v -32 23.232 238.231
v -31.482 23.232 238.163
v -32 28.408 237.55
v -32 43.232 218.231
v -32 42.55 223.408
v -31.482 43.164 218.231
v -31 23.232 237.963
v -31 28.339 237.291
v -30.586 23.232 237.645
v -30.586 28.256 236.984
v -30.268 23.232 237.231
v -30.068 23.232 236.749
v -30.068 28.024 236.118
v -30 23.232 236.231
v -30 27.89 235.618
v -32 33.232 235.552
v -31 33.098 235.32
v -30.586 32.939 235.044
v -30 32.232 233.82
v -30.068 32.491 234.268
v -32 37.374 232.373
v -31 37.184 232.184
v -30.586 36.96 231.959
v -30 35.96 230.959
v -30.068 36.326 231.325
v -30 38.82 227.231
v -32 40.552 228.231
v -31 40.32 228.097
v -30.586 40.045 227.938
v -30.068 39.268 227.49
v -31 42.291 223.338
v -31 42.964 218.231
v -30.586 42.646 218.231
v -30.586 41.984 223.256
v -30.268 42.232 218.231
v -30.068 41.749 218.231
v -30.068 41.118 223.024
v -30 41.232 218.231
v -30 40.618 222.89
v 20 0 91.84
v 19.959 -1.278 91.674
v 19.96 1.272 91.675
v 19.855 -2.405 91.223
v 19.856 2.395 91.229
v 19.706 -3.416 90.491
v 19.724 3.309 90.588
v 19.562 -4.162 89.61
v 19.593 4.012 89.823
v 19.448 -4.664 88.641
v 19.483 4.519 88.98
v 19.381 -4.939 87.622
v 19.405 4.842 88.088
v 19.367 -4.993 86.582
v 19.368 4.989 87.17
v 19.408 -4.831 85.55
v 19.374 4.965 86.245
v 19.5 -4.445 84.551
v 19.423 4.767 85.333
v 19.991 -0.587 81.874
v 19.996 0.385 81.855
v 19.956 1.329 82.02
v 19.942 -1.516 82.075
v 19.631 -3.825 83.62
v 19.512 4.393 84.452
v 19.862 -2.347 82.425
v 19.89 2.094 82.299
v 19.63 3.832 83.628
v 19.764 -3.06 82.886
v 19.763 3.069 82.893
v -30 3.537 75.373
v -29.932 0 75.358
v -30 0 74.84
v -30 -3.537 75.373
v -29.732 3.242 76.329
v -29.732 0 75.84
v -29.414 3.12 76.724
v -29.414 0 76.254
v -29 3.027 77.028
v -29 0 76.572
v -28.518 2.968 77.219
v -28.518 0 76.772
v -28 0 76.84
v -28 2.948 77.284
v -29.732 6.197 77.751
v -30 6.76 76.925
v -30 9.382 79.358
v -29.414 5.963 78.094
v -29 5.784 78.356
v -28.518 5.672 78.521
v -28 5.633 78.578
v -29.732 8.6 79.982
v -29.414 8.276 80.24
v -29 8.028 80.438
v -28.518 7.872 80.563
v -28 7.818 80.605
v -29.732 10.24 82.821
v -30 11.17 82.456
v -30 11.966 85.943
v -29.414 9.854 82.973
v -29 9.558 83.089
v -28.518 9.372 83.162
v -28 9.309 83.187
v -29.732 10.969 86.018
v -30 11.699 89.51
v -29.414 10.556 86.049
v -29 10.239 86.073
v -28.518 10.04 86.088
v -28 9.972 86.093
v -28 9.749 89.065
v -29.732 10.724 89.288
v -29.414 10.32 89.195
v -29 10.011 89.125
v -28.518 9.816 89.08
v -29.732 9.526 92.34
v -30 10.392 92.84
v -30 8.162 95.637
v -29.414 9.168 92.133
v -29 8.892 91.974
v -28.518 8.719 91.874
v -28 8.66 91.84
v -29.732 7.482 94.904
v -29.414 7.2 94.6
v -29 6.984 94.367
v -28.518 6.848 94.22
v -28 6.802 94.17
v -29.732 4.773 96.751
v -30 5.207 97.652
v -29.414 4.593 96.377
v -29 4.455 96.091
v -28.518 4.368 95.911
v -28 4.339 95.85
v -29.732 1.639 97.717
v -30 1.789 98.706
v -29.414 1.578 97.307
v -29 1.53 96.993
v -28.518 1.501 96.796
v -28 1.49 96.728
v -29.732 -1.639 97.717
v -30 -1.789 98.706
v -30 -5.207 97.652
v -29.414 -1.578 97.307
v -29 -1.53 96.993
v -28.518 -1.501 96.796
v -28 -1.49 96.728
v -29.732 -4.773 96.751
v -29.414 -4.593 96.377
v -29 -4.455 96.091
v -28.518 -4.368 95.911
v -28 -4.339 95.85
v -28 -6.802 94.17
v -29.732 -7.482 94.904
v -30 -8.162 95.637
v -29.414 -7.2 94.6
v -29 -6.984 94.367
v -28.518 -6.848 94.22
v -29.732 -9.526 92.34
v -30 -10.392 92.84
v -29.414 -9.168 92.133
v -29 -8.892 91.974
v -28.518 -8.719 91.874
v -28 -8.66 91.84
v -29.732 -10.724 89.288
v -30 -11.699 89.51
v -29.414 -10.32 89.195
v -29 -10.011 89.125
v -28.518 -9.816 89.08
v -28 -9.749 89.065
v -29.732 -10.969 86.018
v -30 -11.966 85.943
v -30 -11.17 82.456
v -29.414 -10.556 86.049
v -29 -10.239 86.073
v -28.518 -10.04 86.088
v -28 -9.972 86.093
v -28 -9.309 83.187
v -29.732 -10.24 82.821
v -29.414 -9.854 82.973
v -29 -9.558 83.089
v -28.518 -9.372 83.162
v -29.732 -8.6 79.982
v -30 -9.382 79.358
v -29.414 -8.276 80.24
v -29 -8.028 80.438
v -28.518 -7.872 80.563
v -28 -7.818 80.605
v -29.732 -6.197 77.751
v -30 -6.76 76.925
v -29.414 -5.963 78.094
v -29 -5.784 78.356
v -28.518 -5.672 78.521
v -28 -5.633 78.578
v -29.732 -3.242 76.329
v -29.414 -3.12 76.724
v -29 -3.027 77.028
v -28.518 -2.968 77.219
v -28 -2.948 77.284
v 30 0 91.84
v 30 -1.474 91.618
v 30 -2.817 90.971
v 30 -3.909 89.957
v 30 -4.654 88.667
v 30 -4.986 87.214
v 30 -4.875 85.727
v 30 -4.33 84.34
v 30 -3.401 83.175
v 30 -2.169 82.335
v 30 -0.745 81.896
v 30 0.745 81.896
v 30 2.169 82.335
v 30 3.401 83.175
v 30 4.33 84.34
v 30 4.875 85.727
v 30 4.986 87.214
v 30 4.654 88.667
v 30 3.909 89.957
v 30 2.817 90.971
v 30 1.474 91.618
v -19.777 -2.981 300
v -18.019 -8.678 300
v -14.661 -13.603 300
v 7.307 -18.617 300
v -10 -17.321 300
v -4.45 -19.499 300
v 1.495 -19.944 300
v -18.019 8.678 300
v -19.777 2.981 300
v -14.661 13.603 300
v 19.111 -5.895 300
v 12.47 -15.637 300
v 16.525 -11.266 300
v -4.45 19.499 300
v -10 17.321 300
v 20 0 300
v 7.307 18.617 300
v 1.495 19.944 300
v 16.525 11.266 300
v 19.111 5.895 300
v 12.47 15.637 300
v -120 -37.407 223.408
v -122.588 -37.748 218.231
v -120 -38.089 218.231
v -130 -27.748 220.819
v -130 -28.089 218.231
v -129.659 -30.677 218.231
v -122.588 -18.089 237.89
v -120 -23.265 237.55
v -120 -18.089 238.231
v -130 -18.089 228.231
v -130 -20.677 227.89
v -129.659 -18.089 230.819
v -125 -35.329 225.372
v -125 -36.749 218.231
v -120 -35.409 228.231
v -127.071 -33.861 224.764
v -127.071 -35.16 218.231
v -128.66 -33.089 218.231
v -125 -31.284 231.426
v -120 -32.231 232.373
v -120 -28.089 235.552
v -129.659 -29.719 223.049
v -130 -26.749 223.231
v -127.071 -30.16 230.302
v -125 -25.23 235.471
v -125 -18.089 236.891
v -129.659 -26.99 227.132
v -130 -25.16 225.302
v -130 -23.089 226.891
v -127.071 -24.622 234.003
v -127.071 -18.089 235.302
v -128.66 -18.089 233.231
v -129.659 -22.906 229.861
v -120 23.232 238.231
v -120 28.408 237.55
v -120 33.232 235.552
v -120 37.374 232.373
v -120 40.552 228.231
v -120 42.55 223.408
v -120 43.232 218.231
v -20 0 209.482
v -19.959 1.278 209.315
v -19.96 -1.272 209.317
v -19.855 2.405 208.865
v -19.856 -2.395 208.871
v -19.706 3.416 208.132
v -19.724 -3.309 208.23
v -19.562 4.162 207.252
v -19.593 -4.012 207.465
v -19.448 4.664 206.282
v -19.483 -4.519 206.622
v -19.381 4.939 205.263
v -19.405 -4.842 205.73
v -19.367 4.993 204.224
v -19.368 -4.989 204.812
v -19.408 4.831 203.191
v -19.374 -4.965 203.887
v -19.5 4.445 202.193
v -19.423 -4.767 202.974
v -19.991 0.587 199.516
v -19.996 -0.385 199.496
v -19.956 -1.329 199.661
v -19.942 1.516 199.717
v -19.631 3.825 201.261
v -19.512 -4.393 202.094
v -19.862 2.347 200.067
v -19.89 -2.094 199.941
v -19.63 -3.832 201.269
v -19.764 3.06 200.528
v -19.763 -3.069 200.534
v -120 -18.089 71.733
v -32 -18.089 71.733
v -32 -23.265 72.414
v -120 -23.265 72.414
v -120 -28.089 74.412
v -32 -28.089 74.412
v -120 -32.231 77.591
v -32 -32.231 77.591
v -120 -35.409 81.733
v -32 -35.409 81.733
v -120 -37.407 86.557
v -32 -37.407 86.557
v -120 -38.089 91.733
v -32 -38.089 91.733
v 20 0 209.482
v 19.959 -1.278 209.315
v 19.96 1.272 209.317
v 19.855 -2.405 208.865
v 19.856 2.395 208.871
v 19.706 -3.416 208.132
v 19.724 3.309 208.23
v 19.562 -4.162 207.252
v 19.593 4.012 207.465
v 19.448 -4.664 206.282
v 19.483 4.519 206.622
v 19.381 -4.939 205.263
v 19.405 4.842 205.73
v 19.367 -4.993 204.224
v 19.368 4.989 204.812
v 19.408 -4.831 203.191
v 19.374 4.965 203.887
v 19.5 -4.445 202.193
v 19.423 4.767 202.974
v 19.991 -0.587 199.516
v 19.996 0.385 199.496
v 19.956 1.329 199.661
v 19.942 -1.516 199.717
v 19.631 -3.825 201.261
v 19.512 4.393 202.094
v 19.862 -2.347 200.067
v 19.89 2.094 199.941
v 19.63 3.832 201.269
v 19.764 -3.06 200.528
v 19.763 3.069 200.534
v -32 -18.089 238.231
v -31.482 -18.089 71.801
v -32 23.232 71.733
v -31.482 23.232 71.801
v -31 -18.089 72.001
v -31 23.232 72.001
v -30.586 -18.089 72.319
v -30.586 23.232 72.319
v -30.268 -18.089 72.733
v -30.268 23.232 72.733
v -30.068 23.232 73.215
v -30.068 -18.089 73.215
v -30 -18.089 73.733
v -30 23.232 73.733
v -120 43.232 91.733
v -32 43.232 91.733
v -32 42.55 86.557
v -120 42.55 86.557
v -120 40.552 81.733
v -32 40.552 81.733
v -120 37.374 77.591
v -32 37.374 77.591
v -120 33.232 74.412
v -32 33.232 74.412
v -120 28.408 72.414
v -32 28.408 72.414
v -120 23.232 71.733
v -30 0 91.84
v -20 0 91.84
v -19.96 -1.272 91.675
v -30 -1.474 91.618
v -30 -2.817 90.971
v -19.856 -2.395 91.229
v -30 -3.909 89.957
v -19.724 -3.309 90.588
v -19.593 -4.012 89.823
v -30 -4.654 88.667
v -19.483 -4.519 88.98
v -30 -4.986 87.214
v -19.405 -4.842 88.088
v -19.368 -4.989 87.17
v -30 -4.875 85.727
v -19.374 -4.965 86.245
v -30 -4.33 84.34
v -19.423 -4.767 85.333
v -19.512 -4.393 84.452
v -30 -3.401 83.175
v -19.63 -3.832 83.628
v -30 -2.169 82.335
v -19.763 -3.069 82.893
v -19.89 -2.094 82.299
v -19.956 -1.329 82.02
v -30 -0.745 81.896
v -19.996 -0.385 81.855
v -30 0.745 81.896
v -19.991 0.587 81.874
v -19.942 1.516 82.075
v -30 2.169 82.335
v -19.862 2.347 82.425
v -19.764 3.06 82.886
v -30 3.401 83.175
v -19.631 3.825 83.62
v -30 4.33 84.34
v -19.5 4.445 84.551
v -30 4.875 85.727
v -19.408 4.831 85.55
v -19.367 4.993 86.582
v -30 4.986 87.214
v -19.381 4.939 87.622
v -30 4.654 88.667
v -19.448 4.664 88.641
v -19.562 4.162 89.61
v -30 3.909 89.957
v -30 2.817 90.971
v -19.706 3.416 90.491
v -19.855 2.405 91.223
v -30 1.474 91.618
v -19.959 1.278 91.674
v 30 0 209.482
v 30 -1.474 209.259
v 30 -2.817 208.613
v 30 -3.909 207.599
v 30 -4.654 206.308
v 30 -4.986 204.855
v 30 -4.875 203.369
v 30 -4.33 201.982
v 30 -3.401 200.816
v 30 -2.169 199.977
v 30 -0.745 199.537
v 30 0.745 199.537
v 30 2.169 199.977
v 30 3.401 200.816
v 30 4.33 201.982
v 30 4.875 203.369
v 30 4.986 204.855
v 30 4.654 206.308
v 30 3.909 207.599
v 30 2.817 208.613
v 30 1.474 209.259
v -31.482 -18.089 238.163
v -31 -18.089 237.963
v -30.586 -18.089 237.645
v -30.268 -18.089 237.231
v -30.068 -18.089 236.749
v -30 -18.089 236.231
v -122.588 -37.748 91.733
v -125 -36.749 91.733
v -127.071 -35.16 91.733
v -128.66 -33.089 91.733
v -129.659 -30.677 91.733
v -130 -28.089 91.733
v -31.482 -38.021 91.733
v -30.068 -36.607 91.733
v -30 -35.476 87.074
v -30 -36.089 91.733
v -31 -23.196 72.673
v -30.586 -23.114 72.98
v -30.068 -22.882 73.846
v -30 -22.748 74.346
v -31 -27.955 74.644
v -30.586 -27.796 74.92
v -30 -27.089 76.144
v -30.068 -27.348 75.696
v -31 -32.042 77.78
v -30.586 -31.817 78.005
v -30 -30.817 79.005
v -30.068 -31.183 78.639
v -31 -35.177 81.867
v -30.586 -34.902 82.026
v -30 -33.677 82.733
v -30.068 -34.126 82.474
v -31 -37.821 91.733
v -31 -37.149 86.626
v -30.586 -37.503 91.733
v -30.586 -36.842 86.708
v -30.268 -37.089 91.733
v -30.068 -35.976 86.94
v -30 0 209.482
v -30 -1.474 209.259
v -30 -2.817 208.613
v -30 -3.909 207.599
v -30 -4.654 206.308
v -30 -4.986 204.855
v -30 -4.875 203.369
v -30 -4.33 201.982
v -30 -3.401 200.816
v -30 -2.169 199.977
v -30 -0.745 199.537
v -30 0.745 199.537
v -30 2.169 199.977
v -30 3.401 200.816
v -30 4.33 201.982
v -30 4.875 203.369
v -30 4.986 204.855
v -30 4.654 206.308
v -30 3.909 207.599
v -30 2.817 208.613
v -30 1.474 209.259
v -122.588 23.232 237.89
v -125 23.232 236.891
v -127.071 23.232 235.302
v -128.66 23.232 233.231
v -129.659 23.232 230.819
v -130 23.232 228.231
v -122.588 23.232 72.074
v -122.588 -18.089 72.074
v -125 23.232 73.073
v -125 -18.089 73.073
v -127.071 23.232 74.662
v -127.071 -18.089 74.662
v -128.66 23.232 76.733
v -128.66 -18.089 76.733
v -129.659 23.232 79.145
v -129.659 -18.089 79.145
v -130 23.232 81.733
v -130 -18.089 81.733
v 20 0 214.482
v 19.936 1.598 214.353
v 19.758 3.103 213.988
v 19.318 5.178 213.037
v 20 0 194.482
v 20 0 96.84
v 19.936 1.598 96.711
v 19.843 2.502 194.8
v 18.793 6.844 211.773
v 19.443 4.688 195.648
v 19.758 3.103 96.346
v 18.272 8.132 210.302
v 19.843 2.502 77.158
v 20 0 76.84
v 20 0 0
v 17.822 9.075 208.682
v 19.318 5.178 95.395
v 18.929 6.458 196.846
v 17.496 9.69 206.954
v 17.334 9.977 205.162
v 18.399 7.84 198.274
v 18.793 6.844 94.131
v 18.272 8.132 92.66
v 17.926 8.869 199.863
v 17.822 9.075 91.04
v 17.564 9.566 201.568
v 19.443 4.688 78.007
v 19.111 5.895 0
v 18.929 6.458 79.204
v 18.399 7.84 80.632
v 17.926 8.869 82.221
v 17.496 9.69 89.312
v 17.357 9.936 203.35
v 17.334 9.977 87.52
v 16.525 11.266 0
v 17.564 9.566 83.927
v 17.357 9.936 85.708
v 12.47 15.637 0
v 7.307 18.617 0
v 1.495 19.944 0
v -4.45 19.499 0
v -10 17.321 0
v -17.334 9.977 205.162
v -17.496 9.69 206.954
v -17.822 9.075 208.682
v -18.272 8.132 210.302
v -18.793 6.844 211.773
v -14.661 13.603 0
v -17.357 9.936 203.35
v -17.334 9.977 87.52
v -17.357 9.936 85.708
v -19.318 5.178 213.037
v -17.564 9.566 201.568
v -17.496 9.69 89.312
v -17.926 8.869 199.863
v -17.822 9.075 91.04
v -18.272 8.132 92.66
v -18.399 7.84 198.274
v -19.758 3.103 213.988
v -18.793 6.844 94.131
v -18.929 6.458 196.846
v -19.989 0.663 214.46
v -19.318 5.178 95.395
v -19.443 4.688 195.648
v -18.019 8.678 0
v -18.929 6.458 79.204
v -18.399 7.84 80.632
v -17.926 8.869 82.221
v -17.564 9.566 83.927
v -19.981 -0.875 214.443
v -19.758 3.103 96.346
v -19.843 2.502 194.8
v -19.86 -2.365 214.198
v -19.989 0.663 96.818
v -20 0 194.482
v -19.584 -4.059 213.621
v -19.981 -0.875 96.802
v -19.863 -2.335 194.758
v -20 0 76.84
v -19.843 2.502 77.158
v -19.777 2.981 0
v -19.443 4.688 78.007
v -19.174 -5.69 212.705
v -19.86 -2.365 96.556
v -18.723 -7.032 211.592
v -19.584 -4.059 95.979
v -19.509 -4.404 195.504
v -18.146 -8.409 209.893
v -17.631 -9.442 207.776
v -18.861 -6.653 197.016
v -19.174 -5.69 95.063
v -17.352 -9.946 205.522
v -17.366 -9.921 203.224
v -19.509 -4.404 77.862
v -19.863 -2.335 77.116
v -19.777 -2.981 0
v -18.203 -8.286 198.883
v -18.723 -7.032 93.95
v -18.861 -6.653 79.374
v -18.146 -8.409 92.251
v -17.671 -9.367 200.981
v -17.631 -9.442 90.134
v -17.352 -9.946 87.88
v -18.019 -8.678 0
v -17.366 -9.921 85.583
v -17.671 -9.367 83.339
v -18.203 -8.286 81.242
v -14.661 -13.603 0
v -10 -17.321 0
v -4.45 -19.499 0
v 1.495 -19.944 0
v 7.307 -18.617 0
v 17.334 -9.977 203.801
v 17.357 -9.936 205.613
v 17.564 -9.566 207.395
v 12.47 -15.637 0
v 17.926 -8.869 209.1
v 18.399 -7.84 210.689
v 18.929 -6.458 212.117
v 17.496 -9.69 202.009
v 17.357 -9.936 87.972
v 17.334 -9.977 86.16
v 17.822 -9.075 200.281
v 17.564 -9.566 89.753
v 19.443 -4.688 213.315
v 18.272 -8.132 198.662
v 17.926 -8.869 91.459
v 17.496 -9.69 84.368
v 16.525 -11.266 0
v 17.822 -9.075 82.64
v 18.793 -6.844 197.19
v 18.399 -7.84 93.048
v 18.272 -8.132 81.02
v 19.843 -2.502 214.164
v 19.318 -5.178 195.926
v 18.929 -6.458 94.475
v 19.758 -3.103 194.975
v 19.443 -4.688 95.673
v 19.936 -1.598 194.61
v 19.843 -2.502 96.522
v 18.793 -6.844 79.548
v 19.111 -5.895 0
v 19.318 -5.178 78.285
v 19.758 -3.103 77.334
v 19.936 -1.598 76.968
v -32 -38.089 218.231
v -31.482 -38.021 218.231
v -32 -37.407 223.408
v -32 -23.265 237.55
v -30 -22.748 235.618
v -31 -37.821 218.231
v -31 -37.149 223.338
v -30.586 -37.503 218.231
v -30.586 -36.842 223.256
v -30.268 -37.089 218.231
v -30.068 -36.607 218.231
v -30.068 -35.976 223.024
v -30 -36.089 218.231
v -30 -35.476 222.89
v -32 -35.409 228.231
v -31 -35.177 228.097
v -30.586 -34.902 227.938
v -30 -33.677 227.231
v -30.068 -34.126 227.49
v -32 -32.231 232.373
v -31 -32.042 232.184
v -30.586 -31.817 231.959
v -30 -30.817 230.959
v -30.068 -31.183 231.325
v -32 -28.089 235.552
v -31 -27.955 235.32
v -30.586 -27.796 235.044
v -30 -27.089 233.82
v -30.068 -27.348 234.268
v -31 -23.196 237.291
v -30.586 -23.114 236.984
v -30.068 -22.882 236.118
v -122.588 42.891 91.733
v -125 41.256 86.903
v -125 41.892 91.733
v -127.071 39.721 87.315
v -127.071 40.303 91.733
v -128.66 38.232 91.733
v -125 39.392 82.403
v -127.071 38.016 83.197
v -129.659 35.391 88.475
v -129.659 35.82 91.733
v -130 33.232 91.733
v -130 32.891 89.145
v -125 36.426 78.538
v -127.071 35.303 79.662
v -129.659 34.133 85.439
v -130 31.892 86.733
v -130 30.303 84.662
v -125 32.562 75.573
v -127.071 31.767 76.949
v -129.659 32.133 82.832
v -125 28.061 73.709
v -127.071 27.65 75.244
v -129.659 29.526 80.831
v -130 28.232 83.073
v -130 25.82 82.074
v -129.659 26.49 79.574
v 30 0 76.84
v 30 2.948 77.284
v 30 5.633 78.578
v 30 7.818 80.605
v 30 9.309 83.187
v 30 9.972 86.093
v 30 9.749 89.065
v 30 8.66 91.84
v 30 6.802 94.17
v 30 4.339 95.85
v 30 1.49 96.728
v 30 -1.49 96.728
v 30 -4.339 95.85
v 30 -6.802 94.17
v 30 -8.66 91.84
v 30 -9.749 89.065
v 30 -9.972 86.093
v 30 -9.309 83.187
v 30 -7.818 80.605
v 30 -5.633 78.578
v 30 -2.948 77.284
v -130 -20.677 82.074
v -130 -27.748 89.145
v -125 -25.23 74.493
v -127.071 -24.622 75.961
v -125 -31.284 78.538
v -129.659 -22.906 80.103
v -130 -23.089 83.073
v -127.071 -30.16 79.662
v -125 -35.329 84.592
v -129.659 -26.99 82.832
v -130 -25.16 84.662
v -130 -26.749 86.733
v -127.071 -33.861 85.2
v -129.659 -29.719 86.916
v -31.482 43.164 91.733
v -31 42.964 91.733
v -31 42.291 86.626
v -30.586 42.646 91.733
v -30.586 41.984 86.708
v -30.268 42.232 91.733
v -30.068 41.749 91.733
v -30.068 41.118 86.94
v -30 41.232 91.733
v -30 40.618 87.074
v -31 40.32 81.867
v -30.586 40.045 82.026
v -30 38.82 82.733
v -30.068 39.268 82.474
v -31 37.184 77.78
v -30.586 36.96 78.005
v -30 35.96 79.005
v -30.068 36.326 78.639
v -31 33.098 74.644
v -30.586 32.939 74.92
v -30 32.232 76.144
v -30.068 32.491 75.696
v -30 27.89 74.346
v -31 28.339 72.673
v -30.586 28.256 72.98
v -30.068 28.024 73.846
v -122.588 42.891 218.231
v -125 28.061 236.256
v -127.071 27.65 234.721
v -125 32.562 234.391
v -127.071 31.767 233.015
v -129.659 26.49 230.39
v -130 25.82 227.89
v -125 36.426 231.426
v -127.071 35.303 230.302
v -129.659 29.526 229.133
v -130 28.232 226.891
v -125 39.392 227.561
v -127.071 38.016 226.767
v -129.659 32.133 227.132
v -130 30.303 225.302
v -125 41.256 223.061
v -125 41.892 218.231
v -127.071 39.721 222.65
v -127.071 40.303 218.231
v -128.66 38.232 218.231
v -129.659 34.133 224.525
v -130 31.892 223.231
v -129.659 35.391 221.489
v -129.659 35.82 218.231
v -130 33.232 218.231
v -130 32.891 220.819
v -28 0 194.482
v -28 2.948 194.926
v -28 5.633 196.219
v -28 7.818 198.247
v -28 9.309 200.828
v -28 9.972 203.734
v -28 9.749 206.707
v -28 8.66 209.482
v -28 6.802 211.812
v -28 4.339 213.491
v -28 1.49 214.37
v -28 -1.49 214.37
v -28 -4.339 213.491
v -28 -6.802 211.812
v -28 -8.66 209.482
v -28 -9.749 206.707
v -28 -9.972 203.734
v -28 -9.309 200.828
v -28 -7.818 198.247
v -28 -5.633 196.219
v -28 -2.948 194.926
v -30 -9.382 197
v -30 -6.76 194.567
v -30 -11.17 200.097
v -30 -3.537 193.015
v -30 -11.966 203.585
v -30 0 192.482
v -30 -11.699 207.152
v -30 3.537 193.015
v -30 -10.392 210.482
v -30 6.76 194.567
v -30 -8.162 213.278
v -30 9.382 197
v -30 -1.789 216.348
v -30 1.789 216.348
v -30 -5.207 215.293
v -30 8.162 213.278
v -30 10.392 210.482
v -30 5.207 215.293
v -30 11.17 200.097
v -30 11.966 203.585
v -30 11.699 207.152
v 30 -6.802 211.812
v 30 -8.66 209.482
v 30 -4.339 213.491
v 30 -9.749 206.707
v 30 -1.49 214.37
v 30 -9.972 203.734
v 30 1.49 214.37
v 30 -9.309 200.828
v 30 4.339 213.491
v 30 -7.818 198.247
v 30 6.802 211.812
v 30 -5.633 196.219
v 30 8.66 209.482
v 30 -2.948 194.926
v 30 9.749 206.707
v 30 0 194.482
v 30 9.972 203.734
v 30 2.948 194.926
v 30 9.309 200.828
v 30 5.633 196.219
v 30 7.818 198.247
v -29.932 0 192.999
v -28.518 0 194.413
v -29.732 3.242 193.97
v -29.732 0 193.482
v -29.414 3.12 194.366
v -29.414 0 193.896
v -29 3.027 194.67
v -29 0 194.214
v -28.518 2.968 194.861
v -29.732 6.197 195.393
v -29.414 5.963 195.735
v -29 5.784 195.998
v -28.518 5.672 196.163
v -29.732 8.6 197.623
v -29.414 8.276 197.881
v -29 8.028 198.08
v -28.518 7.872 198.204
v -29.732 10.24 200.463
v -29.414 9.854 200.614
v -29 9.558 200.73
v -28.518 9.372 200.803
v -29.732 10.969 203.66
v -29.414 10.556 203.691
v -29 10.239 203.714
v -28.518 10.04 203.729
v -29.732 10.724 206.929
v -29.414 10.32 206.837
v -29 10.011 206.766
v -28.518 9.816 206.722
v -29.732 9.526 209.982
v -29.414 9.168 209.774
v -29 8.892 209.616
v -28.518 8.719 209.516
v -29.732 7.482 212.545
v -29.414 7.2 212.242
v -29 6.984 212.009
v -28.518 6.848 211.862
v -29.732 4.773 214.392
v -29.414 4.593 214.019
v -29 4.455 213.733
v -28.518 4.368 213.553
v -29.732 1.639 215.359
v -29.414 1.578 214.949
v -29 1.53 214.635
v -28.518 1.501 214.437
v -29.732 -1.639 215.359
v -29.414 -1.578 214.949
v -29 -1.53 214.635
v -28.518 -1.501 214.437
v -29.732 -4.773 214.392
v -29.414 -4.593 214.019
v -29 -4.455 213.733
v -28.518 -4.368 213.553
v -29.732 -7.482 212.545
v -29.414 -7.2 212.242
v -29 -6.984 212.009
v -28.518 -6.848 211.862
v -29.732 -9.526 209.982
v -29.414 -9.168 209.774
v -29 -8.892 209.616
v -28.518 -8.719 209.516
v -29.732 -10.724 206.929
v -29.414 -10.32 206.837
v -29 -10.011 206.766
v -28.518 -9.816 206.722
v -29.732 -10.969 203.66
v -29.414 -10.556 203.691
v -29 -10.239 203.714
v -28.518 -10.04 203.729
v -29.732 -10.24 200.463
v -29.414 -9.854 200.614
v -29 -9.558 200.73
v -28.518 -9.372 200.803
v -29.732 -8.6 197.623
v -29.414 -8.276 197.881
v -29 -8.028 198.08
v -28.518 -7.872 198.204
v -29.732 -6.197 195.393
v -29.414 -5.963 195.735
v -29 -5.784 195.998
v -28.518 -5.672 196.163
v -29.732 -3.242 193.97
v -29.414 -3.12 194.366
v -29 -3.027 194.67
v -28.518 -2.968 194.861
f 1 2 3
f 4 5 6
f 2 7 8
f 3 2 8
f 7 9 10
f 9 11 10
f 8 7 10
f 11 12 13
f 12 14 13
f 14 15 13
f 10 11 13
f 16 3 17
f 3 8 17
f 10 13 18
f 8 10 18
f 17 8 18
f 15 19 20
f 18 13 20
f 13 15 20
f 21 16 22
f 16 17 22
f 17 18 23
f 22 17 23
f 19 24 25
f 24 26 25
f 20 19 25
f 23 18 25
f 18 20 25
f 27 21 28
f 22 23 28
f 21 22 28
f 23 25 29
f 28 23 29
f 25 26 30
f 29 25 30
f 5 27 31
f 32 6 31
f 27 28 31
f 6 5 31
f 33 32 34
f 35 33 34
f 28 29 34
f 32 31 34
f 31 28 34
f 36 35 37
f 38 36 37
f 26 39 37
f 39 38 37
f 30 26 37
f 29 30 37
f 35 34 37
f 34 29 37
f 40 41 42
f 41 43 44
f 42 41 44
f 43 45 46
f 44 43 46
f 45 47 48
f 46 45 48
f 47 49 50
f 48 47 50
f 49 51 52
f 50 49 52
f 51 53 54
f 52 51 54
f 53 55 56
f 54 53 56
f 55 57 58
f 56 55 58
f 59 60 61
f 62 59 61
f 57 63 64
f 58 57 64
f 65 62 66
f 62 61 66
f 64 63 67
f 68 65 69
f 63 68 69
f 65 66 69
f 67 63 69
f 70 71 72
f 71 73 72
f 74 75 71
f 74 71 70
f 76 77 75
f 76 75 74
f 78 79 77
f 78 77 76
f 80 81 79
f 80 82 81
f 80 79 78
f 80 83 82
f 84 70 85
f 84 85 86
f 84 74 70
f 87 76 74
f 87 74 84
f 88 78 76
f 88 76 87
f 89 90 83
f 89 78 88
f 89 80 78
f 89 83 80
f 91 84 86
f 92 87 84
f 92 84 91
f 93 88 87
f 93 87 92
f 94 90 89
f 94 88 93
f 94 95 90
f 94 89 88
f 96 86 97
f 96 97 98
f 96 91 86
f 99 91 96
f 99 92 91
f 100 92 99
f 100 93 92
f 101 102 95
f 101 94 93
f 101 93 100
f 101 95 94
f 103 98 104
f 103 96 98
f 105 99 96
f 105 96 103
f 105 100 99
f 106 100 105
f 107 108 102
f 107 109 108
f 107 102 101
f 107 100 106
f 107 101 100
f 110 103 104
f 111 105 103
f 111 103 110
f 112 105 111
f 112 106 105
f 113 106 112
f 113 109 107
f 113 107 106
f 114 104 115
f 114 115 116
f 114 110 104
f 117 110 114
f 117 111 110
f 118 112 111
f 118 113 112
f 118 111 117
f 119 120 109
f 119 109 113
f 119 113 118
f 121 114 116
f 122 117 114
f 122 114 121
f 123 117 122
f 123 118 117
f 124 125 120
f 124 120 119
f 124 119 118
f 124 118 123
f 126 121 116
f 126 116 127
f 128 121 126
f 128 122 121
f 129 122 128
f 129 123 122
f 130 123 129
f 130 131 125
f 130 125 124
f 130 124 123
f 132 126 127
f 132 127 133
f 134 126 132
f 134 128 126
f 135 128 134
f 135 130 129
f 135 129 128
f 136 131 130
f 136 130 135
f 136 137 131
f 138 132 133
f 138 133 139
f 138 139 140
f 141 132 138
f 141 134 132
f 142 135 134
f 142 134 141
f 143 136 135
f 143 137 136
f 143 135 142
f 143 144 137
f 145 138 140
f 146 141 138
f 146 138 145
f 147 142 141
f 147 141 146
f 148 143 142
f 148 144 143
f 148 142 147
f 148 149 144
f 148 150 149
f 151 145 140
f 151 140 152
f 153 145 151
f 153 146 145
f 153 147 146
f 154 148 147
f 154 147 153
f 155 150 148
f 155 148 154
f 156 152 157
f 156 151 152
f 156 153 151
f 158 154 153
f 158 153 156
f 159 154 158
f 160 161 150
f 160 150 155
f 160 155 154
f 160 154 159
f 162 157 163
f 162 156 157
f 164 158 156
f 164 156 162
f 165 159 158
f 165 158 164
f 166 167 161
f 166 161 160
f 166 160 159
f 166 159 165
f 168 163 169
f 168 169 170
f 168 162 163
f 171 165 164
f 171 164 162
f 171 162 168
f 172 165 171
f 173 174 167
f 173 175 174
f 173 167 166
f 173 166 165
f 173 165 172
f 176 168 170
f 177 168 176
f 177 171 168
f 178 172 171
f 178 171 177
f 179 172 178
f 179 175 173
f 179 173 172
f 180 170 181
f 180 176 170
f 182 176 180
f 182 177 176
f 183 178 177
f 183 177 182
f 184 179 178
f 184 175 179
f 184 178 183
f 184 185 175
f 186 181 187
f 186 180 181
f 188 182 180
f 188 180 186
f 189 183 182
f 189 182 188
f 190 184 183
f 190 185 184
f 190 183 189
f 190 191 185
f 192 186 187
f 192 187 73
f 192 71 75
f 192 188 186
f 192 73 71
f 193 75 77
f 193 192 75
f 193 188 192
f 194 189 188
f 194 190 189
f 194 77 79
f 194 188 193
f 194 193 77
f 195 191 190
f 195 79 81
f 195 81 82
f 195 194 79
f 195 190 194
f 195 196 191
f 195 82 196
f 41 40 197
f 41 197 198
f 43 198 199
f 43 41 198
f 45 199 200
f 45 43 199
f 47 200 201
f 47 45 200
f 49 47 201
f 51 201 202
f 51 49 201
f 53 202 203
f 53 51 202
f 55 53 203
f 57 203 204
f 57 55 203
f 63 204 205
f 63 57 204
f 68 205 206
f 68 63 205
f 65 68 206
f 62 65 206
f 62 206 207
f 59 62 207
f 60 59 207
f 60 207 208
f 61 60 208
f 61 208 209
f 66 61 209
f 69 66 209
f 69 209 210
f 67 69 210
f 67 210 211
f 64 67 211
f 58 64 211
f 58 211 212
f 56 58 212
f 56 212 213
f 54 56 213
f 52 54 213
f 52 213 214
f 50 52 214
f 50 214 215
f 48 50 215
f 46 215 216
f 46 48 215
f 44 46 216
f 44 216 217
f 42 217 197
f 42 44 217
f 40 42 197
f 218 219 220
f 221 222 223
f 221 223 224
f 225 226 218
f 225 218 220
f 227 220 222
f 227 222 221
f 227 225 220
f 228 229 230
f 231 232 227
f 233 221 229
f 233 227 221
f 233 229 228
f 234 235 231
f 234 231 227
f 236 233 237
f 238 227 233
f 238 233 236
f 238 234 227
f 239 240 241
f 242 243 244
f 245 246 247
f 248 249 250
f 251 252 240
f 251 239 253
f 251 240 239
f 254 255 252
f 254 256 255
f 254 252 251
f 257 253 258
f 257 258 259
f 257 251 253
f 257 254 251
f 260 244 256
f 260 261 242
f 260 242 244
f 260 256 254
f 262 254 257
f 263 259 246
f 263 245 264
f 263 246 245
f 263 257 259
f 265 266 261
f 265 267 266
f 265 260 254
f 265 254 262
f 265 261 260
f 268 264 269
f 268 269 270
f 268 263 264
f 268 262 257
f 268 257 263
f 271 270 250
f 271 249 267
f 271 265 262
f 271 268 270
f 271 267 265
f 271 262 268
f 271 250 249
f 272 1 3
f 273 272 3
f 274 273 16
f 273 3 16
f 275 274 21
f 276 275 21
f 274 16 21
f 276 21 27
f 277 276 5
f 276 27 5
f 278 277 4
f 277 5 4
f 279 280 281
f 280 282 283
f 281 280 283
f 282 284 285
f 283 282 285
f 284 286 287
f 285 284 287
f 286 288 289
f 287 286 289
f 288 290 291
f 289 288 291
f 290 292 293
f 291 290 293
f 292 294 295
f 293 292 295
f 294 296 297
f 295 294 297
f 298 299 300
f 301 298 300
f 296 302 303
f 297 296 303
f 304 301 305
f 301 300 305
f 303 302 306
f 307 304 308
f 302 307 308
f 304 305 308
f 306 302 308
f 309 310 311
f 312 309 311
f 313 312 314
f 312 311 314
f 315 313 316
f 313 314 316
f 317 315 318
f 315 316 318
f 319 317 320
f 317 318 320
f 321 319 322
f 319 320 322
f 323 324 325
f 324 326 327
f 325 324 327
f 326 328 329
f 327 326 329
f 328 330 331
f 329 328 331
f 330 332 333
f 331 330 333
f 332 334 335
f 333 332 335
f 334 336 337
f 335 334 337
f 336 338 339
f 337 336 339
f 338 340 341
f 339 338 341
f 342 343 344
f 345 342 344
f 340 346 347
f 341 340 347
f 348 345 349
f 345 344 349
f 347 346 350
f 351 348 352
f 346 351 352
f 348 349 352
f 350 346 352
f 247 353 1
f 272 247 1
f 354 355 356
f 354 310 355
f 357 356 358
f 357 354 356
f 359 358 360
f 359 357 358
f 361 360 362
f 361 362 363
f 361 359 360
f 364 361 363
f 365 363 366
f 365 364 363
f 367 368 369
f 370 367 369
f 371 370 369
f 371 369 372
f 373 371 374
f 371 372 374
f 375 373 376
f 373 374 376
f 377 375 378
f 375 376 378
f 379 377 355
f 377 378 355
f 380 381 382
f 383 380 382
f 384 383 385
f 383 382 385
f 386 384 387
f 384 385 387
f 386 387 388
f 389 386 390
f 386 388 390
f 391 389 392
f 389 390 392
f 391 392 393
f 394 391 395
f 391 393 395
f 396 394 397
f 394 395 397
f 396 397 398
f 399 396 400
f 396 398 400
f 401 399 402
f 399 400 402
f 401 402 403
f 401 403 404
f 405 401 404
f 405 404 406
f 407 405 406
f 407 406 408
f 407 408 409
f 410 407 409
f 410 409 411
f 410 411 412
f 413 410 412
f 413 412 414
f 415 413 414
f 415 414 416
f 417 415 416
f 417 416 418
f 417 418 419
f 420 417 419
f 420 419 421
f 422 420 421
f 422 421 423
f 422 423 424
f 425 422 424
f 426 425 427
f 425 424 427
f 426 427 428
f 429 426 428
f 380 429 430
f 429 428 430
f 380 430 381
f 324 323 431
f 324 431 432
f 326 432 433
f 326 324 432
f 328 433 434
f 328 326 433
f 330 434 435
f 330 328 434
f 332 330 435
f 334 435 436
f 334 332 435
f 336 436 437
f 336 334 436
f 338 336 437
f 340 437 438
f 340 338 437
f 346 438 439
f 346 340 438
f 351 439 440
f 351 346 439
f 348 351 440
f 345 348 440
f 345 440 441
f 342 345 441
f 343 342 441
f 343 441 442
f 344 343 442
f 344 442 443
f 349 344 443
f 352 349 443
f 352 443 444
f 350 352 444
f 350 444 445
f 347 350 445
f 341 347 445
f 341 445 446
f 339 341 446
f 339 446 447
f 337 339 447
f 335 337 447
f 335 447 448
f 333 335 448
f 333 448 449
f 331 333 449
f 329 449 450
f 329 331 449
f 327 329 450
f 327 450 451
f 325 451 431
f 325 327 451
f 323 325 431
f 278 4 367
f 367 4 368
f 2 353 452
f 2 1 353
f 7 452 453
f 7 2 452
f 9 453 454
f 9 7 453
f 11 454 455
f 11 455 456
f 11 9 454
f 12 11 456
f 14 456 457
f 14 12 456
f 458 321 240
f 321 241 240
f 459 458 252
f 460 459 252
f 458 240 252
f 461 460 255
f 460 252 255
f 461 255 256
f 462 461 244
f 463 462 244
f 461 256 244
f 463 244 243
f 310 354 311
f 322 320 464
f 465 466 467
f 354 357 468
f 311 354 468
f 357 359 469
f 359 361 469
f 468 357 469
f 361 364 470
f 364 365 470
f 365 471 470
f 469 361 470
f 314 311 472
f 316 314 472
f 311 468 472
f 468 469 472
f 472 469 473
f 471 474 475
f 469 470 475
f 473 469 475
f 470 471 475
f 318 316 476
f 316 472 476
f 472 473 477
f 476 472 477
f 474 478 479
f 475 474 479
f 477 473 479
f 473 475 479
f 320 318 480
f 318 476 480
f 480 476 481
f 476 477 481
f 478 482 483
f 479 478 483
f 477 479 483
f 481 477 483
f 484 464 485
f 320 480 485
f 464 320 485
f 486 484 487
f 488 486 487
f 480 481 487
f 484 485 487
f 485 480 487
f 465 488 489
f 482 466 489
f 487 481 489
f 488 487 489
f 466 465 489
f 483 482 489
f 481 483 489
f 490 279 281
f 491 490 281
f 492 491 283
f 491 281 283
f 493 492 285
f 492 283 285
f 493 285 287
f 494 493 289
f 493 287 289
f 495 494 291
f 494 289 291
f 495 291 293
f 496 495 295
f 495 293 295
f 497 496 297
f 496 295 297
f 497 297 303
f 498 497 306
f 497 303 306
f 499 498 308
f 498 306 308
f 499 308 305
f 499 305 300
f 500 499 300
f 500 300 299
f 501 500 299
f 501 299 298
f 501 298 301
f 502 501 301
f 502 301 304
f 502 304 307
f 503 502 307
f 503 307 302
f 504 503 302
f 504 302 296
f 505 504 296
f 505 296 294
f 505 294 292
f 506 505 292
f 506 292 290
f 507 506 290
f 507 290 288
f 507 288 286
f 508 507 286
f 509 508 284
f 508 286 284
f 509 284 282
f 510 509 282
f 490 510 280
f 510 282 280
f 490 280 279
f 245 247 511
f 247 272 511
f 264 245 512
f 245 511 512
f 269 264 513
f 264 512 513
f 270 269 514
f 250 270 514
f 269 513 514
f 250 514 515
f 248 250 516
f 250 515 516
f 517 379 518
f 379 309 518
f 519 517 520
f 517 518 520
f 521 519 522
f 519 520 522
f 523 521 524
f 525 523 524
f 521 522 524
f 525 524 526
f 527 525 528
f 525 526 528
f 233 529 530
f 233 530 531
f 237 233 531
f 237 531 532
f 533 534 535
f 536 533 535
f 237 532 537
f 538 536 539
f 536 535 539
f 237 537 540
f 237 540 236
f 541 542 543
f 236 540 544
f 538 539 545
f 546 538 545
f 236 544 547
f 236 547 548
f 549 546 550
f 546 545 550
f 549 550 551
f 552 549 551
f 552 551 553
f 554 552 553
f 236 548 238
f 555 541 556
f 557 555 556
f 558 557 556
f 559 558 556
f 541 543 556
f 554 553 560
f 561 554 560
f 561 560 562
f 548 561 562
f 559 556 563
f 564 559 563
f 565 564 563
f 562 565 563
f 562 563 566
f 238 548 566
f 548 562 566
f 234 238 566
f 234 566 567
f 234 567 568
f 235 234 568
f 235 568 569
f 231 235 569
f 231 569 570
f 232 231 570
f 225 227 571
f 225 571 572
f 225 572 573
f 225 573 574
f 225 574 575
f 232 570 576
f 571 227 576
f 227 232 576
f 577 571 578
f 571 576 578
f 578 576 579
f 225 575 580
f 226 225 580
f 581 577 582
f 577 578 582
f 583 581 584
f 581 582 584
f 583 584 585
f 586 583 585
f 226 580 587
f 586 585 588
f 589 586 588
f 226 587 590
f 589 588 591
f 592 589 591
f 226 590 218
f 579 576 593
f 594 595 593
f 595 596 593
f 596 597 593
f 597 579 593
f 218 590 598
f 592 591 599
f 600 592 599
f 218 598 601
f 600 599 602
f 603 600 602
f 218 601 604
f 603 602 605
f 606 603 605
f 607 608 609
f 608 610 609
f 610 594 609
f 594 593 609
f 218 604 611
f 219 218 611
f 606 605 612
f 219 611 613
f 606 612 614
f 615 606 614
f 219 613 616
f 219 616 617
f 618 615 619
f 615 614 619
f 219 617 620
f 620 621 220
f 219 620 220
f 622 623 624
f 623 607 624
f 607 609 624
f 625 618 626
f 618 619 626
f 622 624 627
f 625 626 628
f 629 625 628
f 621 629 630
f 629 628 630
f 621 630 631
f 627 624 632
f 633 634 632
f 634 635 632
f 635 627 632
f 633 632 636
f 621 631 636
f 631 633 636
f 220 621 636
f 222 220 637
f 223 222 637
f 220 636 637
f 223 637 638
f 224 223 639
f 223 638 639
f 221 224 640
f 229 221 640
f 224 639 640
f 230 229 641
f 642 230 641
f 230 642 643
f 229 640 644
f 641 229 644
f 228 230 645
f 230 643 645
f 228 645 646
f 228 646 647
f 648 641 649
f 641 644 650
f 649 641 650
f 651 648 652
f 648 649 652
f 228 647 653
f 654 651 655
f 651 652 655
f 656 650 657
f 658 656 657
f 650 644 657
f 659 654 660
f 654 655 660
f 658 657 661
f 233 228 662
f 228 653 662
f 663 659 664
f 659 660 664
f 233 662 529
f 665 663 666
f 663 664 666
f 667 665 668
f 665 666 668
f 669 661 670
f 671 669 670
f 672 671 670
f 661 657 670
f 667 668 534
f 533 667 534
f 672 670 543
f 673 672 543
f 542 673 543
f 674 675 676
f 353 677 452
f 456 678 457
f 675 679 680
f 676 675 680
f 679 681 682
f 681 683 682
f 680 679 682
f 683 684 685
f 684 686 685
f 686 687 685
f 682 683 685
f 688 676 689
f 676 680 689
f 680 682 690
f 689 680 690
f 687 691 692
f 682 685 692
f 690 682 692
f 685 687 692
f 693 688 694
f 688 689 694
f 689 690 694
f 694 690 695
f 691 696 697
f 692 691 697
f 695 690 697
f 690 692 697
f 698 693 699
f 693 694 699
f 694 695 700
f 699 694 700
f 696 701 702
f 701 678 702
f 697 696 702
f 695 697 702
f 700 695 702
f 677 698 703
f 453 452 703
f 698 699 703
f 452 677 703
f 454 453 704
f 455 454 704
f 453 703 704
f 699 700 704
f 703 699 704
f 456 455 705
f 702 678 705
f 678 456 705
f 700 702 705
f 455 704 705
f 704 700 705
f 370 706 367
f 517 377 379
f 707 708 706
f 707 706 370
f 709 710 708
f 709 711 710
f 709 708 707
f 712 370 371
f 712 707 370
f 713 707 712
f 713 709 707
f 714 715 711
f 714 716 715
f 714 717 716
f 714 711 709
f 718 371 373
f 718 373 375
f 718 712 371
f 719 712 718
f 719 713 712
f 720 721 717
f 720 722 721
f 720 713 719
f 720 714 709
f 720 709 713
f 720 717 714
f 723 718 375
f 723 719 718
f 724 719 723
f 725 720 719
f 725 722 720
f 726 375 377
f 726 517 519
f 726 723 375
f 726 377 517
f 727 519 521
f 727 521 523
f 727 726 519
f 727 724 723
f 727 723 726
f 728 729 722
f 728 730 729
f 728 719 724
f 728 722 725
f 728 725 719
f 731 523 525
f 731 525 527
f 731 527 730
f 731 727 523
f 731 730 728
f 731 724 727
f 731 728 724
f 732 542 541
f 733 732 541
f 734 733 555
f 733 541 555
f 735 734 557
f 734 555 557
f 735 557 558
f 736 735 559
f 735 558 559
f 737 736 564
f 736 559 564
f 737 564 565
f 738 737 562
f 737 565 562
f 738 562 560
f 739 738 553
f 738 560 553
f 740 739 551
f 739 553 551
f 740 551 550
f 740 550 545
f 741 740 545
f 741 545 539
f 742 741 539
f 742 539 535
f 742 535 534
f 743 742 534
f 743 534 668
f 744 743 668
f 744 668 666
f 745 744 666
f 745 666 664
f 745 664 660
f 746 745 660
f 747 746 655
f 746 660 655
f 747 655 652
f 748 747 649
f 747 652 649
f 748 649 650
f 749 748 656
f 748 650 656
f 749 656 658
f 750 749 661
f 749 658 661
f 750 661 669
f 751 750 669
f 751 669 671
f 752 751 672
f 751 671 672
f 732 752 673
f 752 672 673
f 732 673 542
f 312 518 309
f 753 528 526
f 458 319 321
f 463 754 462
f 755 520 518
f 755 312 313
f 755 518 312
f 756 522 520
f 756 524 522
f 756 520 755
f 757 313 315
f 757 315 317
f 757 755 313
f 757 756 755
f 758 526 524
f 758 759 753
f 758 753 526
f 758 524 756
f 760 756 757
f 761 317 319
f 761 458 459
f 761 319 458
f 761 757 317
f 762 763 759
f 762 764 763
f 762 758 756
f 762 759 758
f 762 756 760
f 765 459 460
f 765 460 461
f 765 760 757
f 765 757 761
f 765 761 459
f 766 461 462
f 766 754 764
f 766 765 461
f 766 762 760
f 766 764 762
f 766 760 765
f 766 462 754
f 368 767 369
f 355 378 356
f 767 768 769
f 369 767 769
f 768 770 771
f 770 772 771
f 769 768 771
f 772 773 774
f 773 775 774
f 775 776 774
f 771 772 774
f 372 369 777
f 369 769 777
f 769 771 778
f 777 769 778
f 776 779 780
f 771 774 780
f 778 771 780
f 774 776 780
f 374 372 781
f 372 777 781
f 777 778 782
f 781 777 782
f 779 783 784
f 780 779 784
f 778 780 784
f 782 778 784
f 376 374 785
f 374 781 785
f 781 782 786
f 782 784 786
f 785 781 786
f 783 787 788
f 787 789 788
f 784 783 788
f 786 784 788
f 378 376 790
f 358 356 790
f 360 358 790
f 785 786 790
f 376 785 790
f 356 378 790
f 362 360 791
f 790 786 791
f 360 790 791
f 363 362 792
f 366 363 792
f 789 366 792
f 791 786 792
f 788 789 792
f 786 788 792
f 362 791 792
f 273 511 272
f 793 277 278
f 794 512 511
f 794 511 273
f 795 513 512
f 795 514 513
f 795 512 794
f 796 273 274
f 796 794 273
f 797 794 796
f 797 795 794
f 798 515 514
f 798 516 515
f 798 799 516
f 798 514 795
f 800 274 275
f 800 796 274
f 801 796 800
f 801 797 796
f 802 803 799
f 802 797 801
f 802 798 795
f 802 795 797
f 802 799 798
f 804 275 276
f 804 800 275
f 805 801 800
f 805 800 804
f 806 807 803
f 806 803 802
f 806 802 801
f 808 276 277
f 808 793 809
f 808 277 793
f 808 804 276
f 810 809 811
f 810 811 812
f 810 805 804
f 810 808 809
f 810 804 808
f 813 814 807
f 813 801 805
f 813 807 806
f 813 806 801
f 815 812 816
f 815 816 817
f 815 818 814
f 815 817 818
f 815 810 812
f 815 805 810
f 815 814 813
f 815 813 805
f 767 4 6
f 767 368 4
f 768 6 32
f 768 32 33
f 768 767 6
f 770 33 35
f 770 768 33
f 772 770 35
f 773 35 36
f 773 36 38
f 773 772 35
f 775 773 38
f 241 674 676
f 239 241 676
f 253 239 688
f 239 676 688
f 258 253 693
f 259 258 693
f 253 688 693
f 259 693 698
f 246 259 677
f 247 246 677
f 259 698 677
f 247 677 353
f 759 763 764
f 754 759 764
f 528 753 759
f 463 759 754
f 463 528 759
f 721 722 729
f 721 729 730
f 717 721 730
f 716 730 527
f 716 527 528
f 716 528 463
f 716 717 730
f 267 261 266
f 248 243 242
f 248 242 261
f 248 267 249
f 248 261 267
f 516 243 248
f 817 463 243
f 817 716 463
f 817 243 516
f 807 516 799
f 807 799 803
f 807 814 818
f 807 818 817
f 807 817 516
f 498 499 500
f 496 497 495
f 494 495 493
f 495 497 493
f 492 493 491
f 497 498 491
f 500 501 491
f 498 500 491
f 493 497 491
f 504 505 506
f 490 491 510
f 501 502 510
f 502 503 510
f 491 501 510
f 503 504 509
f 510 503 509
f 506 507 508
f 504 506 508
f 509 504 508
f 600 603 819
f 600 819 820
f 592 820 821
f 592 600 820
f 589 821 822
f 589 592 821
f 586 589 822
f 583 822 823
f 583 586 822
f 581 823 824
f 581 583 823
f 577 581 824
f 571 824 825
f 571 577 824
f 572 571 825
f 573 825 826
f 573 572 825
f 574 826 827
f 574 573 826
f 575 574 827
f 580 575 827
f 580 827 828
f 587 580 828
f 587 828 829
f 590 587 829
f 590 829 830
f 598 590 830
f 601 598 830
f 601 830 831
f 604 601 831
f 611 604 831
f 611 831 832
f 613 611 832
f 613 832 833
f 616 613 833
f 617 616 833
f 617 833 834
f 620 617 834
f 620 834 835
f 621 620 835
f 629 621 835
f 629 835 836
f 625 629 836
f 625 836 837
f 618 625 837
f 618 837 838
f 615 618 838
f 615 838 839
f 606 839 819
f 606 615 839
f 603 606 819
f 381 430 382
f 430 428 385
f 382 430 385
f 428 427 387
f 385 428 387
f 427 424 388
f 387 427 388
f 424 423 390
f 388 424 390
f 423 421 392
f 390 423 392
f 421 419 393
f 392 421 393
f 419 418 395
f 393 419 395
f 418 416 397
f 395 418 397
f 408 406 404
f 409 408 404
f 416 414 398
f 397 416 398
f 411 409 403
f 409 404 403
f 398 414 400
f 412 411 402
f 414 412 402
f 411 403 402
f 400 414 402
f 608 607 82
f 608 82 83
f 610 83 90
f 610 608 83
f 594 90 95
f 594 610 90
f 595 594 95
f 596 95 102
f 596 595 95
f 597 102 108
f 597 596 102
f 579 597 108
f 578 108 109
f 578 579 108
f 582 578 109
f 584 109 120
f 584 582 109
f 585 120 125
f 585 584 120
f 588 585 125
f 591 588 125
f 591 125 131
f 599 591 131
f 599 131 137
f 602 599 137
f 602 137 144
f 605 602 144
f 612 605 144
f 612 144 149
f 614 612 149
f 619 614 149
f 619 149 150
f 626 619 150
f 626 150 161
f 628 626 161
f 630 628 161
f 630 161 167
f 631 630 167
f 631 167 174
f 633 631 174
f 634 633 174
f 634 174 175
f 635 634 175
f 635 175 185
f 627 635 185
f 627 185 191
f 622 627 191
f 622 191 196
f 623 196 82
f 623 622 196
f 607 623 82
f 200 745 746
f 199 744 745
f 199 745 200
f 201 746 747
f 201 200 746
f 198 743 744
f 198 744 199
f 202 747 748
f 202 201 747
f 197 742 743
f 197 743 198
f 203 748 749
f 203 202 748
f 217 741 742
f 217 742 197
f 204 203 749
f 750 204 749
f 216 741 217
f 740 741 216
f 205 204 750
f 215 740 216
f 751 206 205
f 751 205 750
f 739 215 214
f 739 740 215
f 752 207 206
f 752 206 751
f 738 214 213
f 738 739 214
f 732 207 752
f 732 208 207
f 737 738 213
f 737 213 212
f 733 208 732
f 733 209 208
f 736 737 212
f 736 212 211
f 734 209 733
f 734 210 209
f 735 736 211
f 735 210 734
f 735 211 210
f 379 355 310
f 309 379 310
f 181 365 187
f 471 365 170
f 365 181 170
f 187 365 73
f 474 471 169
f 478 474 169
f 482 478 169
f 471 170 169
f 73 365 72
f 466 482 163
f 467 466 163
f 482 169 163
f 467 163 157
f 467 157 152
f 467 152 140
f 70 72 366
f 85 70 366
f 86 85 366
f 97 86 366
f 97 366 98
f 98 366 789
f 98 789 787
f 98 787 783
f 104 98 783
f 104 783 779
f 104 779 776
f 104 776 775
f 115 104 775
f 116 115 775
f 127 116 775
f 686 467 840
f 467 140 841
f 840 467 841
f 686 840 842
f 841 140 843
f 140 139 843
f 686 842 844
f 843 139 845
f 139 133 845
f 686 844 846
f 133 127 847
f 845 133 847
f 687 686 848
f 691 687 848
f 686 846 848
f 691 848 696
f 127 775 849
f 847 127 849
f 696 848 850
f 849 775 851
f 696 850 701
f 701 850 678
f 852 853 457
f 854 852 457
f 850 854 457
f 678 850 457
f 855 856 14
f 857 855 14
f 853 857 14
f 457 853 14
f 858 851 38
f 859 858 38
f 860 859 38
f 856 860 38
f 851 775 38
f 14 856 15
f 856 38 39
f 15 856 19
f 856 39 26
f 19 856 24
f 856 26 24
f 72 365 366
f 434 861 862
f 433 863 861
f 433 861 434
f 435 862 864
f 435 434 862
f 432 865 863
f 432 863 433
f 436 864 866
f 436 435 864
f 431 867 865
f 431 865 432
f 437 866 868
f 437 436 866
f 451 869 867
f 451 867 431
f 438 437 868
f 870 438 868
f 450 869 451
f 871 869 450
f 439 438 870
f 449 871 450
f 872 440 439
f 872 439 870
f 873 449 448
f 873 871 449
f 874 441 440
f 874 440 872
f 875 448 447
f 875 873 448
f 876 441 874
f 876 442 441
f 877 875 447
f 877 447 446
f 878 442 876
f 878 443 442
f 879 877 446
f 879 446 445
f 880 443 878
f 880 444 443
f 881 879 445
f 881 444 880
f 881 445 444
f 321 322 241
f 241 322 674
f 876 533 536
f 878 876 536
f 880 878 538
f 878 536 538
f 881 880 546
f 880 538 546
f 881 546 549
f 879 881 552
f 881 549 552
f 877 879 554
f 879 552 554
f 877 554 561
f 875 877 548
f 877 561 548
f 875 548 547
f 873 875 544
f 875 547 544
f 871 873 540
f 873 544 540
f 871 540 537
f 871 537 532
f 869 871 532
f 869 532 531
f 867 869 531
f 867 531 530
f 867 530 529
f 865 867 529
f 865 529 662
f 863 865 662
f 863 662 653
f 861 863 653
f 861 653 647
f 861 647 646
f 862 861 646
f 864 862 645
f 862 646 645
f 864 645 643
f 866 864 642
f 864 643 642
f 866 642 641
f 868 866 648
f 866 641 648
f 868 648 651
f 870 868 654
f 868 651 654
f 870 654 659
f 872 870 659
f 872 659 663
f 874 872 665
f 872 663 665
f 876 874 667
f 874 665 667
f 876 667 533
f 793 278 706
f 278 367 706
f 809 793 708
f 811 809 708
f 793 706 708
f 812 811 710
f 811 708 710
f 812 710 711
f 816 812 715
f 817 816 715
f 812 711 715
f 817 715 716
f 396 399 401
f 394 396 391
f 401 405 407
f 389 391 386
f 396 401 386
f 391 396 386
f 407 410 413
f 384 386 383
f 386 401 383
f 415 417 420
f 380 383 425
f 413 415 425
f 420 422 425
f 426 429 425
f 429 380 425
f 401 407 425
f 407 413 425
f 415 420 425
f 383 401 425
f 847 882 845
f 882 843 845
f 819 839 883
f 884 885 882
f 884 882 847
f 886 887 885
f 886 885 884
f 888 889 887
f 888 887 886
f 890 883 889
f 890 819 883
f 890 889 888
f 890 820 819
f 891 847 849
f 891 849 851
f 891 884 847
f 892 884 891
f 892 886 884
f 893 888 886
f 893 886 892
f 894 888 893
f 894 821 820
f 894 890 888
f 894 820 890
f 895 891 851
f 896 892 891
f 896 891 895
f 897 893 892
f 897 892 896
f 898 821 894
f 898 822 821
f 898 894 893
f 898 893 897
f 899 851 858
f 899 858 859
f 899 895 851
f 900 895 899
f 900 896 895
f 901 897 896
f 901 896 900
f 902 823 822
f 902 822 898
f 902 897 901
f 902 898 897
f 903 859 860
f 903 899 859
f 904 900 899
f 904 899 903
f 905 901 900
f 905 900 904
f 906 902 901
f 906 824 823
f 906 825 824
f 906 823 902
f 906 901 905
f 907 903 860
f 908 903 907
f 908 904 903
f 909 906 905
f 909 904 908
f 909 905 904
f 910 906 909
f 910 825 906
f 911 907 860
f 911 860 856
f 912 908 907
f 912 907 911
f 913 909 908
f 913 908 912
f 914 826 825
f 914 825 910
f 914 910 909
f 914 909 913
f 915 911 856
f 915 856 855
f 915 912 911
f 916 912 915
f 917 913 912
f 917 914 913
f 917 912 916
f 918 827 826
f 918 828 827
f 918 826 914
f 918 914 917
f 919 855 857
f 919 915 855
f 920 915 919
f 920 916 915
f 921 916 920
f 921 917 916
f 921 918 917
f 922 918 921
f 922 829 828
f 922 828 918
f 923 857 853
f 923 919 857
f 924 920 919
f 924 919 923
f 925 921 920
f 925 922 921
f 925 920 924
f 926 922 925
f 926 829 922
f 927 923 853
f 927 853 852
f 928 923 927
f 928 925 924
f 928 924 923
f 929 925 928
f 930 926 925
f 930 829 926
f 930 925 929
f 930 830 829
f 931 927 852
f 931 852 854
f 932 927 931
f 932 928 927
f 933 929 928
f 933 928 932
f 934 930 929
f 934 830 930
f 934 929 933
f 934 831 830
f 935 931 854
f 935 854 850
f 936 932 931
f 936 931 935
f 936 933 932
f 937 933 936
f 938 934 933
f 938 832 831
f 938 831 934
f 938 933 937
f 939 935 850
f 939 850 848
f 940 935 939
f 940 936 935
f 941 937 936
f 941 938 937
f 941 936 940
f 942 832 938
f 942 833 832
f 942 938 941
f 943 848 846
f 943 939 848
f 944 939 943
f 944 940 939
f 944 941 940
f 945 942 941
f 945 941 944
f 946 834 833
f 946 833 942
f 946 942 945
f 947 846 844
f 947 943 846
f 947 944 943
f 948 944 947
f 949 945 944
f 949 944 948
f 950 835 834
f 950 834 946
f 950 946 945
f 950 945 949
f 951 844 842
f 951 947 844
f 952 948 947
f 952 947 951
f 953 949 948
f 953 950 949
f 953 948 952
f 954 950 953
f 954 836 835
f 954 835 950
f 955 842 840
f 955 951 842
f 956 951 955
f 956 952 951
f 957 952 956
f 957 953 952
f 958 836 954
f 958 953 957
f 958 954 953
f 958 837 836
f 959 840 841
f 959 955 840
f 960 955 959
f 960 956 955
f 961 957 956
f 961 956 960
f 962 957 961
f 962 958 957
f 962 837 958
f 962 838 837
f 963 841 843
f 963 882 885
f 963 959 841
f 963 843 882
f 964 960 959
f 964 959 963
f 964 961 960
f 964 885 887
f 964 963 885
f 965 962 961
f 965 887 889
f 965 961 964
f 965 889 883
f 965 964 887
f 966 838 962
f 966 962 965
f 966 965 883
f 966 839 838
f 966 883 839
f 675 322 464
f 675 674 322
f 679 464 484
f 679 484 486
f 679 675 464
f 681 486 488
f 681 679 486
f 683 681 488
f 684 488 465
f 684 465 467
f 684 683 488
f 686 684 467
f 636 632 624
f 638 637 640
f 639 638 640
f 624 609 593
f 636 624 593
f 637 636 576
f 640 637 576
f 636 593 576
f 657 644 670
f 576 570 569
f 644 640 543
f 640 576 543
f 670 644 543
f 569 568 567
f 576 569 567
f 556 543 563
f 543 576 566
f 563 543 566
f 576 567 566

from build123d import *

# Parameters (mm, degrees)
SZKIC1_R                    = 20
DODANIE_WYCI_GNI_CIE1_DEPTH = 300
SZKIC2_R                    = 10
SZKIC2_R_2                  = 5
DODANIE_WYCI_GNI_CIE2_DEPTH = 30
DODANIE_WYCI_GNI_CIE3_DEPTH = 100
ZAOKR_GLENIE1_R             = 10
ZAOKR_GLENIE2_R             = 2


with BuildPart() as part:
    # Szkic1 → Dodanie-wyciągnięcie1 (new body)
    with BuildSketch(Plane.XY):
        Circle(SZKIC1_R)
    extrude(amount=DODANIE_WYCI_GNI_CIE1_DEPTH)

    # Szkic2 → Dodanie-wyciągnięcie2 (add)
    # profile 1 of 2: a face of its own
    with BuildSketch(Plane(origin=(0, 0, 0), x_dir=(0, 0, -1), z_dir=(1, 0, 0))):
        with Locations((-204.481584116, 0)):
            Circle(SZKIC2_R)
        with Locations(Location((-204.481584116, 0, 0), (0, 0, 180))):
            Circle(SZKIC2_R_2, mode=Mode.SUBTRACT)
    # profile 2 of 2: a face of its own
    with BuildSketch(Plane(origin=(0, 0, 0), x_dir=(0, 0, -1), z_dir=(1, 0, 0))):
        with Locations((-86.839933458, 0)):
            Circle(SZKIC2_R)
        with Locations(Location((-86.839933458, 0, 0), (0, 0, 180))):
            Circle(SZKIC2_R_2, mode=Mode.SUBTRACT)
    dodanie_wyci_gni_cie2 = extrude(amount=DODANIE_WYCI_GNI_CIE2_DEPTH)

    # Lustro1: Dodanie-wyciągnięcie2 across plane
    add(dodanie_wyci_gni_cie2.mirror(Plane(origin=(0, 0, 0), x_dir=(0, 0, 1), z_dir=(1, 0, 0))))

    # Szkic3 → Dodanie-wyciągnięcie3 (add)
    with BuildSketch(Plane.ZY.offset(30)):
        with BuildLine():
            Line((91.732945532, -38.08889509), (218.231237994, -38.08889509))
            ThreePointArc((218.231237994, -38.08889509), (232.373373618, -32.231030714), (238.231237994, -18.08889509))
            Line((238.231237994, -18.08889509), (238.231237994, 23.231699491))
            ThreePointArc((238.231237994, 23.231699491), (232.373373618, 37.373835114), (218.231237994, 43.231699491))
            Line((218.231237994, 43.231699491), (91.732945532, 43.231699491))
            ThreePointArc((91.732945532, 43.231699491), (77.590809908, 37.373835114), (71.732945532, 23.231699491))
            Line((71.732945532, 23.231699491), (71.732945532, -18.08889509))
            ThreePointArc((71.732945532, -18.08889509), (77.590809908, -32.231030714), (91.732945532, -38.08889509))
        make_face()
    extrude(amount=DODANIE_WYCI_GNI_CIE3_DEPTH)

    # Zaokrąglenie1
    zaokr_glenie1_edges = [part.edges().sort_by_distance(p)[0] for p in [
        (-130, -32.231030714, 77.590809908),
        (-130, -38.08889509, 154.982091763),
        (-130, -32.231030714, 232.373373618),
        (-130, 2.5714022, 238.231237994),
        (-130, 37.373835114, 232.373373618),
        (-130, 43.231699491, 154.982091763),
        (-130, 37.373835114, 77.590809908),
        (-130, 2.5714022, 71.732945532),
    ]]
    fillet(zaokr_glenie1_edges, radius=ZAOKR_GLENIE1_R)

    # Zaokrąglenie2
    zaokr_glenie2_edges = [part.edges().sort_by_distance(p)[0] for p in [
        (-30, 0, 214.481584116),
        (-30, 0, 96.839933458),
        (-30, -32.231030714, 77.590809908),
        (-30, -38.08889509, 154.982091763),
        (-30, -32.231030714, 232.373373618),
        (-30, 2.5714022, 238.231237994),
        (-30, 37.373835114, 232.373373618),
        (-30, 43.231699491, 154.982091763),
        (-30, 37.373835114, 77.590809908),
        (-30, 2.5714022, 71.732945532),
    ]]
    fillet(zaokr_glenie2_edges, radius=ZAOKR_GLENIE2_R)


solid = part.part
